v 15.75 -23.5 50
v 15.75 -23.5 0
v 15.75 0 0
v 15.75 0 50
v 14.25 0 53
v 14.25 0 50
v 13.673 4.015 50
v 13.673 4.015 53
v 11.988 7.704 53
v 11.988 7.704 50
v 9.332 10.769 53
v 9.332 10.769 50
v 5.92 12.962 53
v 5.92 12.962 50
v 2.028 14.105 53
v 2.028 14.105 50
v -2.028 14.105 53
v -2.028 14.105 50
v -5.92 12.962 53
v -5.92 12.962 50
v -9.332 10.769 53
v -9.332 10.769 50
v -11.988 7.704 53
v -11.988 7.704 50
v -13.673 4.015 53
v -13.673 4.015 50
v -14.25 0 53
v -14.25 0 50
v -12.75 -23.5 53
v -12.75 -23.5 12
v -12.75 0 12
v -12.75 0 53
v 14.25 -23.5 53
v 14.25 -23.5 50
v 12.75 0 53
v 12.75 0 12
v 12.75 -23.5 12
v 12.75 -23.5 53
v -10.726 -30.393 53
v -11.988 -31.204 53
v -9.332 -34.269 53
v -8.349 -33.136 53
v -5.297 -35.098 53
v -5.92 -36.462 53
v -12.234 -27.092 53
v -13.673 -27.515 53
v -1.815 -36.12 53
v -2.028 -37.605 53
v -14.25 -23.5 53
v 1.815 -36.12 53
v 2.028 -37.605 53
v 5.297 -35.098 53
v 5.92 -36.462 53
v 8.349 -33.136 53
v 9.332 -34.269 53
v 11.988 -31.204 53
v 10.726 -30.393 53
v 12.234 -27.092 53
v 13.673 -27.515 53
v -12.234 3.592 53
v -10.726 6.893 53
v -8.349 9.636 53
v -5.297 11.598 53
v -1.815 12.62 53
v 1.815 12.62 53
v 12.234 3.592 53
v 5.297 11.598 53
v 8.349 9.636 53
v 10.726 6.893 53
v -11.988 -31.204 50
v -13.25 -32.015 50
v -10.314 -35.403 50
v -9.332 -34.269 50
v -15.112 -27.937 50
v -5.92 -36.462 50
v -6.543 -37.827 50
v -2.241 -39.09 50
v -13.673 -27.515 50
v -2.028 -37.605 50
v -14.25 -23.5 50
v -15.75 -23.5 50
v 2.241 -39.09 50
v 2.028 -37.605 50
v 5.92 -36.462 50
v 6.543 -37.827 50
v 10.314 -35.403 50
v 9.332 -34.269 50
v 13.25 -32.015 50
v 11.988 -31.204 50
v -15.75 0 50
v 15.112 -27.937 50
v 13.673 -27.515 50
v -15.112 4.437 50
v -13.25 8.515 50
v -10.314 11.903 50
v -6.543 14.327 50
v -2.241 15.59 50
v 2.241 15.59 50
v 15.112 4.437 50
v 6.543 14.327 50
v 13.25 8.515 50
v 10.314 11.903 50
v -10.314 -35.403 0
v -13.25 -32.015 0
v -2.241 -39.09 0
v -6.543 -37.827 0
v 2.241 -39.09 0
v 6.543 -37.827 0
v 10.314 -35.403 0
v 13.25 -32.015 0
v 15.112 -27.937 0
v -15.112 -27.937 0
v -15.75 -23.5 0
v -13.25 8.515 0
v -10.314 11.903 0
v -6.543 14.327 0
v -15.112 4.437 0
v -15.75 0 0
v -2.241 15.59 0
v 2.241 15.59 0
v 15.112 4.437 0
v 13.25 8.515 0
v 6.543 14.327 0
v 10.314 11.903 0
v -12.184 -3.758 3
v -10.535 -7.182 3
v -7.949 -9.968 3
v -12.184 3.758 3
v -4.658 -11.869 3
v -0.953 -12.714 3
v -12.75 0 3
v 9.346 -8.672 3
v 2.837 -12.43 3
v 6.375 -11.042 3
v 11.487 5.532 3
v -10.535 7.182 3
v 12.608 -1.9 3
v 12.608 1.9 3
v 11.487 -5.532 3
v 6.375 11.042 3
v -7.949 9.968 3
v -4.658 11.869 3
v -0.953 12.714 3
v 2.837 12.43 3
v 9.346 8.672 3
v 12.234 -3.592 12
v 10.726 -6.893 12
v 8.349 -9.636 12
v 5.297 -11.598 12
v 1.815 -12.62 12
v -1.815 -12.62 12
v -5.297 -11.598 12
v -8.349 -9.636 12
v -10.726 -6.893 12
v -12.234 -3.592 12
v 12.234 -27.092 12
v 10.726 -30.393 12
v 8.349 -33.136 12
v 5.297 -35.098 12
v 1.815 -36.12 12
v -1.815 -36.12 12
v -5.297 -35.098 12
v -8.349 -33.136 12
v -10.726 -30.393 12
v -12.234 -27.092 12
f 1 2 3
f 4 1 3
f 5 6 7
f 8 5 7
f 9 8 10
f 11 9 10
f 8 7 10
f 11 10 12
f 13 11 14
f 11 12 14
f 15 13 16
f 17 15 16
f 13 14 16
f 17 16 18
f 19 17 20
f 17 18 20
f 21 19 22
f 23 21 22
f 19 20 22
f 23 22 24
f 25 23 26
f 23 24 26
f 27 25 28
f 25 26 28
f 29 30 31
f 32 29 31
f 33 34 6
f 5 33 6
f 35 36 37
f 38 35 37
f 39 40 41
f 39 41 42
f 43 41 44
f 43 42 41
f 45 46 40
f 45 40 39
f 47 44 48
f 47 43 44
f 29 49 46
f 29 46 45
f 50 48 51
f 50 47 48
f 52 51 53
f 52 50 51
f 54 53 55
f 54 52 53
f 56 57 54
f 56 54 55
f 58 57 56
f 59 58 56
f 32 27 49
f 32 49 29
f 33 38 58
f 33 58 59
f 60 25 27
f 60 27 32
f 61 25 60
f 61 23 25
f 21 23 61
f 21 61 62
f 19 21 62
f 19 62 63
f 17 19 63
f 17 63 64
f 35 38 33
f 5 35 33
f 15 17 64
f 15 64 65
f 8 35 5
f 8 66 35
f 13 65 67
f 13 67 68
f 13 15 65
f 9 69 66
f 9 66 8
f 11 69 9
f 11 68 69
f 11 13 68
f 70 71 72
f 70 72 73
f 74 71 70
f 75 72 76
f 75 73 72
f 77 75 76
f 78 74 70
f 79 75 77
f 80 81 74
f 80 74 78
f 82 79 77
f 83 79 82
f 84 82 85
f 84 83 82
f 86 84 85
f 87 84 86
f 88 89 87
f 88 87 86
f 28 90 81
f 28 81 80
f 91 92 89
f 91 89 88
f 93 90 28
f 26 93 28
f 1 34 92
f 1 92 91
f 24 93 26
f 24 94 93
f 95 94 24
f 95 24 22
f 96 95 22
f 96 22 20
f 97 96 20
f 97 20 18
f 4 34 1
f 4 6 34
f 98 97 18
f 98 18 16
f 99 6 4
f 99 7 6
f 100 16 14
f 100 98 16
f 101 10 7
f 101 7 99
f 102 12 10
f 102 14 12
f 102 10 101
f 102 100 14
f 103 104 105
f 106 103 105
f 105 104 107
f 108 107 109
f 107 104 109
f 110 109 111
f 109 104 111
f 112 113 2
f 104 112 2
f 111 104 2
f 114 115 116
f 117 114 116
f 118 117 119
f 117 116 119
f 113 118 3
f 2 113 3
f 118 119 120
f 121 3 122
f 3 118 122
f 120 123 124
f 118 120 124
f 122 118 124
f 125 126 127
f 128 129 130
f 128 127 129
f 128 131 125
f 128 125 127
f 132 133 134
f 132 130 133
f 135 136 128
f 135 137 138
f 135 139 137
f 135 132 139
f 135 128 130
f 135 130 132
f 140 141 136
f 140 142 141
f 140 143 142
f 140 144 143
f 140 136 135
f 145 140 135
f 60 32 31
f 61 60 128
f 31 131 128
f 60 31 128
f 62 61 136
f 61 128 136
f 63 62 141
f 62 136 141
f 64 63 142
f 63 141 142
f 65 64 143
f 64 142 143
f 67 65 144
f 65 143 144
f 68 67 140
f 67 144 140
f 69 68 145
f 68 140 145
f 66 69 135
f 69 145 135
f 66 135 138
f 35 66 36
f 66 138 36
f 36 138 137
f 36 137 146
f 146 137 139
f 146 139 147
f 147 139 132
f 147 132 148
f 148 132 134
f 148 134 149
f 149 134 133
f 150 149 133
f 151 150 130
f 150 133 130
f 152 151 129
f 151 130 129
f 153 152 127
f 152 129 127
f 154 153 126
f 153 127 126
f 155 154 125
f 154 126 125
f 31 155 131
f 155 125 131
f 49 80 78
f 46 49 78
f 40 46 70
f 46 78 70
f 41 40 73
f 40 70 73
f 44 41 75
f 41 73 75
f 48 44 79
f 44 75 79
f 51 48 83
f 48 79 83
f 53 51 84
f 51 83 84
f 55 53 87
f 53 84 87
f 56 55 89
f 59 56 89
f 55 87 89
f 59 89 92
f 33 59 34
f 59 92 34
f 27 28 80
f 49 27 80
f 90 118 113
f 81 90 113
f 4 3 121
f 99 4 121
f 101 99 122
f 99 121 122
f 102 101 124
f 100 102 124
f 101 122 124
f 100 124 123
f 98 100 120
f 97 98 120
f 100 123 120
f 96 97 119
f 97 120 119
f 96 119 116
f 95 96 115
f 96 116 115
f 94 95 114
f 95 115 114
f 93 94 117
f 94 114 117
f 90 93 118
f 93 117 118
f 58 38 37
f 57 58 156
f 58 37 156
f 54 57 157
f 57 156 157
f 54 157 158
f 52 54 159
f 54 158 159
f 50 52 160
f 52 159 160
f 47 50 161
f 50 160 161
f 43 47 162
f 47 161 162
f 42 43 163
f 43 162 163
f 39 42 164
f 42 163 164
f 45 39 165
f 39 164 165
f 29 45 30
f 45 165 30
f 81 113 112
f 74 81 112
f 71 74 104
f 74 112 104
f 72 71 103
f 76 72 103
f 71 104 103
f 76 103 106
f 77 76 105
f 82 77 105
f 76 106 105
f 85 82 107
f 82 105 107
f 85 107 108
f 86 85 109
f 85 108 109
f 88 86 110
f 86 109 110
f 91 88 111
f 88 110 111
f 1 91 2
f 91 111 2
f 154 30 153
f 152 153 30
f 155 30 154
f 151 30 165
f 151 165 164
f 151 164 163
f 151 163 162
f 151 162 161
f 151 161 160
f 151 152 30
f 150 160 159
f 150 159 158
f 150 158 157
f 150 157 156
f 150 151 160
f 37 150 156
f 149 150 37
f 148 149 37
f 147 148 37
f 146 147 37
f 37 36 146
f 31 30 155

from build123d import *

# Parameters (mm, degrees)
F1_DEPTH = 3
F2_DEPTH = 12
F3_DEPTH = 50
F5_DEPTH = 3


with BuildPart() as f1:
    # F0 (on Top) → F1 (new body)
    with BuildSketch(Plane.XY):
        with BuildLine():
            Line((15.75, -23.5), (15.75, 0))
            ThreePointArc((15.75, 0), (0, 15.75), (-15.75, 0))
            Line((-15.75, 0), (-15.75, -23.5))
            ThreePointArc((-15.75, -23.5), (0, -39.25), (15.75, -23.5))
        make_face()
        with BuildLine():
            ThreePointArc((-12.75, 0), (0, 12.75), (12.75, 0))
            Line((12.75, 0), (12.75, -23.5))
            ThreePointArc((12.75, -23.5), (0, -36.25), (-12.75, -23.5))
            Line((-12.75, -23.5), (-12.75, 0))
        make_face(mode=Mode.SUBTRACT)
        with BuildLine():
            ThreePointArc((-12.75, 0), (0, -12.75), (12.75, 0))
            ThreePointArc((12.75, 0), (0, 12.75), (-12.75, 0))
        make_face()
        with BuildLine():
            Line((12.75, -23.5), (12.75, 0))
            ThreePointArc((12.75, 0), (0, -12.75), (-12.75, 0))
            Line((-12.75, 0), (-12.75, -23.5))
            ThreePointArc((-12.75, -23.5), (0, -36.25), (12.75, -23.5))
        make_face()
    extrude(amount=F1_DEPTH)

    # F0 (on Top) → F2 (join)
    with BuildSketch(Plane.XY):
        with BuildLine():
            Line((12.75, -23.5), (12.75, 0))
            ThreePointArc((12.75, 0), (0, -12.75), (-12.75, 0))
            Line((-12.75, 0), (-12.75, -23.5))
            ThreePointArc((-12.75, -23.5), (0, -36.25), (12.75, -23.5))
        make_face()
    extrude(amount=F2_DEPTH)

    # F0 (on Top) → F3 (join)
    with BuildSketch(Plane.XY):
        with BuildLine():
            Line((15.75, -23.5), (15.75, 0))
            ThreePointArc((15.75, 0), (0, 15.75), (-15.75, 0))
            Line((-15.75, 0), (-15.75, -23.5))
            ThreePointArc((-15.75, -23.5), (0, -39.25), (15.75, -23.5))
        make_face()
        with BuildLine():
            ThreePointArc((-12.75, 0), (0, 12.75), (12.75, 0))
            Line((12.75, 0), (12.75, -23.5))
            ThreePointArc((12.75, -23.5), (0, -36.25), (-12.75, -23.5))
            Line((-12.75, -23.5), (-12.75, 0))
        make_face(mode=Mode.SUBTRACT)
    extrude(amount=F3_DEPTH)

    # F4 (on face) → F5 (join)
    with BuildSketch(Plane.XY.offset(50)):
        with BuildLine():
            ThreePointArc((14.25, 0), (0, 14.25), (-14.25, 0))
            Line((-14.25, 0), (-14.25, -23.5))
            ThreePointArc((-14.25, -23.5), (0, -37.75), (14.25, -23.5))
            Line((14.25, -23.5), (14.25, 0))
        make_face()
        with BuildLine():
            ThreePointArc((-12.75, 0), (0, 12.75), (12.75, 0))
            Line((12.75, 0), (12.75, -23.5))
            ThreePointArc((12.75, -23.5), (0, -36.25), (-12.75, -23.5))
            Line((-12.75, -23.5), (-12.75, 0))
        make_face(mode=Mode.SUBTRACT)
    extrude(amount=F5_DEPTH)


solid = f1.part
